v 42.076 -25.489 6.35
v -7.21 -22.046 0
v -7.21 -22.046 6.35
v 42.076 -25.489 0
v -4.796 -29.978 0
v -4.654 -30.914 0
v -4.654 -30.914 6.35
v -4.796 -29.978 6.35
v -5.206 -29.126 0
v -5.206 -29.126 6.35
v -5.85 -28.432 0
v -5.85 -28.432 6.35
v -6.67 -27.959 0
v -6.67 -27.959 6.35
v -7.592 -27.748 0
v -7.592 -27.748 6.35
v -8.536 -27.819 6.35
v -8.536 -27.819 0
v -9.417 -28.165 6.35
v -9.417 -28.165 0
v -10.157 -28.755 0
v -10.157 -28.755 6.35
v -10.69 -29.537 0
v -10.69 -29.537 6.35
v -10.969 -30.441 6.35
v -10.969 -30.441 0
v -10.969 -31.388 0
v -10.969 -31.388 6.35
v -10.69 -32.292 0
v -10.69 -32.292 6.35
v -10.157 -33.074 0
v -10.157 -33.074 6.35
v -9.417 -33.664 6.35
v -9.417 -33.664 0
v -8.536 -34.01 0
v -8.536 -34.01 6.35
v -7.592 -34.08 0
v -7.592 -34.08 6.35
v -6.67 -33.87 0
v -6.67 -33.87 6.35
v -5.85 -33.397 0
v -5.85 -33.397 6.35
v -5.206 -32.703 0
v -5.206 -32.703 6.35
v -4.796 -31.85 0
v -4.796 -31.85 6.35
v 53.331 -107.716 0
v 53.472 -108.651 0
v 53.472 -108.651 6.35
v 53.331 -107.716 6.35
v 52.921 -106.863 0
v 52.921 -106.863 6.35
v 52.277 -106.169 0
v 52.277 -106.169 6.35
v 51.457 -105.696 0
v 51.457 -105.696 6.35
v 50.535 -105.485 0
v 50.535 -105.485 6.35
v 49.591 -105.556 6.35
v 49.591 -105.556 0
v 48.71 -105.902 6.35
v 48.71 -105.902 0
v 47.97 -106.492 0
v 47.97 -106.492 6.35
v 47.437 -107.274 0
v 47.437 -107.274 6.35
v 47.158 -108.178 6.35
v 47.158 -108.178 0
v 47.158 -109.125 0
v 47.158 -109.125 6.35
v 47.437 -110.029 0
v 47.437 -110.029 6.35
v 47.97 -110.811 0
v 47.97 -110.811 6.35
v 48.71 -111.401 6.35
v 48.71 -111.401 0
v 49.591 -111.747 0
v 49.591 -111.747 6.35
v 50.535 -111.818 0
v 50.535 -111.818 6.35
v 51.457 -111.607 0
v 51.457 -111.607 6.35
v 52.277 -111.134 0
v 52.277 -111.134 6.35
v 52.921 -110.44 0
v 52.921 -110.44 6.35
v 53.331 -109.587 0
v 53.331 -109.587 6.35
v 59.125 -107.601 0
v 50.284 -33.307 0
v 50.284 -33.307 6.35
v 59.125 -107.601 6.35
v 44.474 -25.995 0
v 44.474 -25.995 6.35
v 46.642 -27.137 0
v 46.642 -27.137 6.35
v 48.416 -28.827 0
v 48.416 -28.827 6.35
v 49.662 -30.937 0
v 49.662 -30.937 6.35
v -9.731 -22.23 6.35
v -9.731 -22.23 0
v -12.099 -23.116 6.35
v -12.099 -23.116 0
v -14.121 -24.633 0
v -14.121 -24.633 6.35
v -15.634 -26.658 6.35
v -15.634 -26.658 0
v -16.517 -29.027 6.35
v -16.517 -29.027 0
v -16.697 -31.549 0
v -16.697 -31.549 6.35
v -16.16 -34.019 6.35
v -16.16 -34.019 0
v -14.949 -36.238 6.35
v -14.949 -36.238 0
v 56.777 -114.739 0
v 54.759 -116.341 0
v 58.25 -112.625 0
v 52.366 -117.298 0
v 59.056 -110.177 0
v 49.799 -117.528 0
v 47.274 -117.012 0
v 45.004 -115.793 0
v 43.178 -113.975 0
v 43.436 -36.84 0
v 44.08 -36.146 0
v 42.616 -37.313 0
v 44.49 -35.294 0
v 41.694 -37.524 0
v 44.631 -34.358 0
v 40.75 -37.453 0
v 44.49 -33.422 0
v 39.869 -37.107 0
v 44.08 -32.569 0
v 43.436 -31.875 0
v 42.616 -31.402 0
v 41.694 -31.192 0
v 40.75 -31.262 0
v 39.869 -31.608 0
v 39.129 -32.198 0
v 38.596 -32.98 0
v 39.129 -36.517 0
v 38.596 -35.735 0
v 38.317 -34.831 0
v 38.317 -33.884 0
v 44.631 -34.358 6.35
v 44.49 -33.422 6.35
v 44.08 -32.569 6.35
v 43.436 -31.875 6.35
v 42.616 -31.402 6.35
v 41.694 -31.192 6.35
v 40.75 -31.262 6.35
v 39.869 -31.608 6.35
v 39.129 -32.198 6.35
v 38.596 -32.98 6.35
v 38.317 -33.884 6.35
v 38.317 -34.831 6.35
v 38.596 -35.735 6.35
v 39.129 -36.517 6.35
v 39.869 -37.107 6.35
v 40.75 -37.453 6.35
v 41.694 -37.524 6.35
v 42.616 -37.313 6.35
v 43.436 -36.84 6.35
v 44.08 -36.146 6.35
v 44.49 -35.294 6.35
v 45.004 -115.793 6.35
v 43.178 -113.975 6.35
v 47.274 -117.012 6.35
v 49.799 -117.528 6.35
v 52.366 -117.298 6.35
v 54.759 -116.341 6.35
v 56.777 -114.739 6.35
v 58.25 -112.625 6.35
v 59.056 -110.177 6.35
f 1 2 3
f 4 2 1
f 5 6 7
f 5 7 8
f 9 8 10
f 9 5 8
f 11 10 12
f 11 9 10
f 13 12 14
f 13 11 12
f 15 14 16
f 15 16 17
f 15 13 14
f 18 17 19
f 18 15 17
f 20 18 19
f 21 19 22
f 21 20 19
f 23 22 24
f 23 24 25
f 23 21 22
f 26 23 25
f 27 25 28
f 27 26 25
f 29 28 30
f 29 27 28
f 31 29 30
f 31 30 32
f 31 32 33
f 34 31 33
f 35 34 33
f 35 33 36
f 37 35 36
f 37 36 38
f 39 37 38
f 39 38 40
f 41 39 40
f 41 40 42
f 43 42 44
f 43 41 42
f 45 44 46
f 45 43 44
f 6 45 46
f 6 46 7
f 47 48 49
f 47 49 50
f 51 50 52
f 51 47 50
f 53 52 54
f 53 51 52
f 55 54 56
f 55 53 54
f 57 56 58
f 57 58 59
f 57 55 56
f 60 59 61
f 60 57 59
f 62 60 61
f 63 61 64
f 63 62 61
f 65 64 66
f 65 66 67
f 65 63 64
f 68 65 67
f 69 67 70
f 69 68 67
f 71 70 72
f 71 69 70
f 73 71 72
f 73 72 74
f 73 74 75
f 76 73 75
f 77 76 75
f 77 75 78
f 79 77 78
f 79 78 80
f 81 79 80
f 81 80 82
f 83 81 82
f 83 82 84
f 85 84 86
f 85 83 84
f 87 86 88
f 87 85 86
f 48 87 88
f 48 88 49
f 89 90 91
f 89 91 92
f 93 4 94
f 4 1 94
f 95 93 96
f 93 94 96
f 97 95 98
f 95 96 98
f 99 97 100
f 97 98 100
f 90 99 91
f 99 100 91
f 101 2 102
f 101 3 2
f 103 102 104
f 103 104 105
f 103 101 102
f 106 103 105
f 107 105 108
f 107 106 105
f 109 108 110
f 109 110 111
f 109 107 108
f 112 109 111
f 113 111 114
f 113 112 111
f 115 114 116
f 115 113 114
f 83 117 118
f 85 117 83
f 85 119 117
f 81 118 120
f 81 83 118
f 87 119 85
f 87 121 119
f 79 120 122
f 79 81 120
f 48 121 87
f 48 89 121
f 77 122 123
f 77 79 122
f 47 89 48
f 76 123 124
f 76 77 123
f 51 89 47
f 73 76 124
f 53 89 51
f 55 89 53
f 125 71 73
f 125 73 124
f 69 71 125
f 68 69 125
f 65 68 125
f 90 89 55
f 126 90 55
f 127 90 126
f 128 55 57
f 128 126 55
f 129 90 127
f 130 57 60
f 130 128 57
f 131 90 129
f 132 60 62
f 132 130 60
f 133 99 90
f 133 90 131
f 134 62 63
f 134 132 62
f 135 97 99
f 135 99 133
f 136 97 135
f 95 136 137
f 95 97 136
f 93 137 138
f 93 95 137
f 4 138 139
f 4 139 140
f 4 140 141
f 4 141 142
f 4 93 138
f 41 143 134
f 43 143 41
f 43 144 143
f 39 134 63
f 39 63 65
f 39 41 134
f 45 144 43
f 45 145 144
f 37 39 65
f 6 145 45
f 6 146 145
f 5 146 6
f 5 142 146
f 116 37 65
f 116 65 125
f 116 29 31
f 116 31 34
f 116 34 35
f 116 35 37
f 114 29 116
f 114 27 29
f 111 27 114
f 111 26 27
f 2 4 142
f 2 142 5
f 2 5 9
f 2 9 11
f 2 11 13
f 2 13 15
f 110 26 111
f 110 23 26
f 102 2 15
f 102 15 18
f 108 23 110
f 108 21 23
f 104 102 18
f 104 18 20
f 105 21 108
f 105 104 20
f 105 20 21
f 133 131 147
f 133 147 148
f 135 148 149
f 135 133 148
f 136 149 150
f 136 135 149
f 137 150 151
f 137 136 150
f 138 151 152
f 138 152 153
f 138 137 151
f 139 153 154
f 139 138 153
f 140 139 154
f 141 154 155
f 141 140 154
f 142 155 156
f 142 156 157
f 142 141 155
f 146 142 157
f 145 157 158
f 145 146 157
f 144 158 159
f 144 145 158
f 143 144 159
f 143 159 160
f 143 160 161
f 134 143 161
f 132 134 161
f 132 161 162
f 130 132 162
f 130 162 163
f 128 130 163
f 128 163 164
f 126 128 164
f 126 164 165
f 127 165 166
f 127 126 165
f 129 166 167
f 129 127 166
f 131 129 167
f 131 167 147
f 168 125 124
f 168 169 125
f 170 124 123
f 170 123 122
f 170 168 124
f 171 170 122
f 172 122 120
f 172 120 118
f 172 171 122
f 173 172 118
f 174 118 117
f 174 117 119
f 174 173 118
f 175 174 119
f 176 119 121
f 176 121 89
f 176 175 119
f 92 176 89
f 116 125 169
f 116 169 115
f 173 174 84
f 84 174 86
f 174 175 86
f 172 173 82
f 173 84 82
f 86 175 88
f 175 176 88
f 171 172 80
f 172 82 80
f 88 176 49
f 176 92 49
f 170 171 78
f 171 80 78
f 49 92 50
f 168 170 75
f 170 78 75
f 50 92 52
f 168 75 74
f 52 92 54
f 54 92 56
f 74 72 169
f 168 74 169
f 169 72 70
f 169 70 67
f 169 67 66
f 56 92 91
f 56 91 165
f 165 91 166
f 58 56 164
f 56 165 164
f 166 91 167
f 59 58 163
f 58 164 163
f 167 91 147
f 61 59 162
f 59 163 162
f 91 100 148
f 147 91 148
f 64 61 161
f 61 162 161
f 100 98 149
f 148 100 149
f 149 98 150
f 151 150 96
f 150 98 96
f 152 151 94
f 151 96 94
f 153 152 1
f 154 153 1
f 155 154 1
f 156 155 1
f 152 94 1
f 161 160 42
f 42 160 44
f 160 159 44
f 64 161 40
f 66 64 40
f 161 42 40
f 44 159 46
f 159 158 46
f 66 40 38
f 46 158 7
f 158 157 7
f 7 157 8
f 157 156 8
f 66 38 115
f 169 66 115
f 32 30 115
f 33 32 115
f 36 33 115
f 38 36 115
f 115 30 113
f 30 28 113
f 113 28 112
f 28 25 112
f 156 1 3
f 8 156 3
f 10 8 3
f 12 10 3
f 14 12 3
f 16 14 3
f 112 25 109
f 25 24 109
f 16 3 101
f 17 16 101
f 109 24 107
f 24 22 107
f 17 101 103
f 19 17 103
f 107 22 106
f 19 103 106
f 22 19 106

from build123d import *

# Parameters (mm, degrees)
SKETCH1_R           = 3.175
BOSS_EXTRUDE1_DEPTH = 6.35
FILLET1_R           = 8.89


with BuildPart() as part:
    # Sketch1 → Boss-Extrude1 (new body)
    with BuildSketch(Plane.XY):
        Polygon((-26.572670207, -20.693163298), (49.414762795, -26.00204572), (63.045667666, -140.545952681), align=None)
        with Locations((-7.829487562, -30.914331115)):
            Circle(SKETCH1_R, mode=Mode.SUBTRACT)
        with Locations((41.456372883, -34.357700996)):
            Circle(SKETCH1_R, mode=Mode.SUBTRACT)
        with Locations((50.297451581, -108.651499199)):
            Circle(SKETCH1_R, mode=Mode.SUBTRACT)
    extrude(amount=BOSS_EXTRUDE1_DEPTH)

    # Fillet1
    fillet1_edges = [part.edges().sort_by_distance(p)[0] for p in [
        (-26.572670207, -20.693163298, 3.175),
        (49.414762795, -26.00204572, 3.175),
        (63.045667666, -140.545952681, 3.175),
    ]]
    fillet(fillet1_edges, radius=FILLET1_R)


solid = part.part
